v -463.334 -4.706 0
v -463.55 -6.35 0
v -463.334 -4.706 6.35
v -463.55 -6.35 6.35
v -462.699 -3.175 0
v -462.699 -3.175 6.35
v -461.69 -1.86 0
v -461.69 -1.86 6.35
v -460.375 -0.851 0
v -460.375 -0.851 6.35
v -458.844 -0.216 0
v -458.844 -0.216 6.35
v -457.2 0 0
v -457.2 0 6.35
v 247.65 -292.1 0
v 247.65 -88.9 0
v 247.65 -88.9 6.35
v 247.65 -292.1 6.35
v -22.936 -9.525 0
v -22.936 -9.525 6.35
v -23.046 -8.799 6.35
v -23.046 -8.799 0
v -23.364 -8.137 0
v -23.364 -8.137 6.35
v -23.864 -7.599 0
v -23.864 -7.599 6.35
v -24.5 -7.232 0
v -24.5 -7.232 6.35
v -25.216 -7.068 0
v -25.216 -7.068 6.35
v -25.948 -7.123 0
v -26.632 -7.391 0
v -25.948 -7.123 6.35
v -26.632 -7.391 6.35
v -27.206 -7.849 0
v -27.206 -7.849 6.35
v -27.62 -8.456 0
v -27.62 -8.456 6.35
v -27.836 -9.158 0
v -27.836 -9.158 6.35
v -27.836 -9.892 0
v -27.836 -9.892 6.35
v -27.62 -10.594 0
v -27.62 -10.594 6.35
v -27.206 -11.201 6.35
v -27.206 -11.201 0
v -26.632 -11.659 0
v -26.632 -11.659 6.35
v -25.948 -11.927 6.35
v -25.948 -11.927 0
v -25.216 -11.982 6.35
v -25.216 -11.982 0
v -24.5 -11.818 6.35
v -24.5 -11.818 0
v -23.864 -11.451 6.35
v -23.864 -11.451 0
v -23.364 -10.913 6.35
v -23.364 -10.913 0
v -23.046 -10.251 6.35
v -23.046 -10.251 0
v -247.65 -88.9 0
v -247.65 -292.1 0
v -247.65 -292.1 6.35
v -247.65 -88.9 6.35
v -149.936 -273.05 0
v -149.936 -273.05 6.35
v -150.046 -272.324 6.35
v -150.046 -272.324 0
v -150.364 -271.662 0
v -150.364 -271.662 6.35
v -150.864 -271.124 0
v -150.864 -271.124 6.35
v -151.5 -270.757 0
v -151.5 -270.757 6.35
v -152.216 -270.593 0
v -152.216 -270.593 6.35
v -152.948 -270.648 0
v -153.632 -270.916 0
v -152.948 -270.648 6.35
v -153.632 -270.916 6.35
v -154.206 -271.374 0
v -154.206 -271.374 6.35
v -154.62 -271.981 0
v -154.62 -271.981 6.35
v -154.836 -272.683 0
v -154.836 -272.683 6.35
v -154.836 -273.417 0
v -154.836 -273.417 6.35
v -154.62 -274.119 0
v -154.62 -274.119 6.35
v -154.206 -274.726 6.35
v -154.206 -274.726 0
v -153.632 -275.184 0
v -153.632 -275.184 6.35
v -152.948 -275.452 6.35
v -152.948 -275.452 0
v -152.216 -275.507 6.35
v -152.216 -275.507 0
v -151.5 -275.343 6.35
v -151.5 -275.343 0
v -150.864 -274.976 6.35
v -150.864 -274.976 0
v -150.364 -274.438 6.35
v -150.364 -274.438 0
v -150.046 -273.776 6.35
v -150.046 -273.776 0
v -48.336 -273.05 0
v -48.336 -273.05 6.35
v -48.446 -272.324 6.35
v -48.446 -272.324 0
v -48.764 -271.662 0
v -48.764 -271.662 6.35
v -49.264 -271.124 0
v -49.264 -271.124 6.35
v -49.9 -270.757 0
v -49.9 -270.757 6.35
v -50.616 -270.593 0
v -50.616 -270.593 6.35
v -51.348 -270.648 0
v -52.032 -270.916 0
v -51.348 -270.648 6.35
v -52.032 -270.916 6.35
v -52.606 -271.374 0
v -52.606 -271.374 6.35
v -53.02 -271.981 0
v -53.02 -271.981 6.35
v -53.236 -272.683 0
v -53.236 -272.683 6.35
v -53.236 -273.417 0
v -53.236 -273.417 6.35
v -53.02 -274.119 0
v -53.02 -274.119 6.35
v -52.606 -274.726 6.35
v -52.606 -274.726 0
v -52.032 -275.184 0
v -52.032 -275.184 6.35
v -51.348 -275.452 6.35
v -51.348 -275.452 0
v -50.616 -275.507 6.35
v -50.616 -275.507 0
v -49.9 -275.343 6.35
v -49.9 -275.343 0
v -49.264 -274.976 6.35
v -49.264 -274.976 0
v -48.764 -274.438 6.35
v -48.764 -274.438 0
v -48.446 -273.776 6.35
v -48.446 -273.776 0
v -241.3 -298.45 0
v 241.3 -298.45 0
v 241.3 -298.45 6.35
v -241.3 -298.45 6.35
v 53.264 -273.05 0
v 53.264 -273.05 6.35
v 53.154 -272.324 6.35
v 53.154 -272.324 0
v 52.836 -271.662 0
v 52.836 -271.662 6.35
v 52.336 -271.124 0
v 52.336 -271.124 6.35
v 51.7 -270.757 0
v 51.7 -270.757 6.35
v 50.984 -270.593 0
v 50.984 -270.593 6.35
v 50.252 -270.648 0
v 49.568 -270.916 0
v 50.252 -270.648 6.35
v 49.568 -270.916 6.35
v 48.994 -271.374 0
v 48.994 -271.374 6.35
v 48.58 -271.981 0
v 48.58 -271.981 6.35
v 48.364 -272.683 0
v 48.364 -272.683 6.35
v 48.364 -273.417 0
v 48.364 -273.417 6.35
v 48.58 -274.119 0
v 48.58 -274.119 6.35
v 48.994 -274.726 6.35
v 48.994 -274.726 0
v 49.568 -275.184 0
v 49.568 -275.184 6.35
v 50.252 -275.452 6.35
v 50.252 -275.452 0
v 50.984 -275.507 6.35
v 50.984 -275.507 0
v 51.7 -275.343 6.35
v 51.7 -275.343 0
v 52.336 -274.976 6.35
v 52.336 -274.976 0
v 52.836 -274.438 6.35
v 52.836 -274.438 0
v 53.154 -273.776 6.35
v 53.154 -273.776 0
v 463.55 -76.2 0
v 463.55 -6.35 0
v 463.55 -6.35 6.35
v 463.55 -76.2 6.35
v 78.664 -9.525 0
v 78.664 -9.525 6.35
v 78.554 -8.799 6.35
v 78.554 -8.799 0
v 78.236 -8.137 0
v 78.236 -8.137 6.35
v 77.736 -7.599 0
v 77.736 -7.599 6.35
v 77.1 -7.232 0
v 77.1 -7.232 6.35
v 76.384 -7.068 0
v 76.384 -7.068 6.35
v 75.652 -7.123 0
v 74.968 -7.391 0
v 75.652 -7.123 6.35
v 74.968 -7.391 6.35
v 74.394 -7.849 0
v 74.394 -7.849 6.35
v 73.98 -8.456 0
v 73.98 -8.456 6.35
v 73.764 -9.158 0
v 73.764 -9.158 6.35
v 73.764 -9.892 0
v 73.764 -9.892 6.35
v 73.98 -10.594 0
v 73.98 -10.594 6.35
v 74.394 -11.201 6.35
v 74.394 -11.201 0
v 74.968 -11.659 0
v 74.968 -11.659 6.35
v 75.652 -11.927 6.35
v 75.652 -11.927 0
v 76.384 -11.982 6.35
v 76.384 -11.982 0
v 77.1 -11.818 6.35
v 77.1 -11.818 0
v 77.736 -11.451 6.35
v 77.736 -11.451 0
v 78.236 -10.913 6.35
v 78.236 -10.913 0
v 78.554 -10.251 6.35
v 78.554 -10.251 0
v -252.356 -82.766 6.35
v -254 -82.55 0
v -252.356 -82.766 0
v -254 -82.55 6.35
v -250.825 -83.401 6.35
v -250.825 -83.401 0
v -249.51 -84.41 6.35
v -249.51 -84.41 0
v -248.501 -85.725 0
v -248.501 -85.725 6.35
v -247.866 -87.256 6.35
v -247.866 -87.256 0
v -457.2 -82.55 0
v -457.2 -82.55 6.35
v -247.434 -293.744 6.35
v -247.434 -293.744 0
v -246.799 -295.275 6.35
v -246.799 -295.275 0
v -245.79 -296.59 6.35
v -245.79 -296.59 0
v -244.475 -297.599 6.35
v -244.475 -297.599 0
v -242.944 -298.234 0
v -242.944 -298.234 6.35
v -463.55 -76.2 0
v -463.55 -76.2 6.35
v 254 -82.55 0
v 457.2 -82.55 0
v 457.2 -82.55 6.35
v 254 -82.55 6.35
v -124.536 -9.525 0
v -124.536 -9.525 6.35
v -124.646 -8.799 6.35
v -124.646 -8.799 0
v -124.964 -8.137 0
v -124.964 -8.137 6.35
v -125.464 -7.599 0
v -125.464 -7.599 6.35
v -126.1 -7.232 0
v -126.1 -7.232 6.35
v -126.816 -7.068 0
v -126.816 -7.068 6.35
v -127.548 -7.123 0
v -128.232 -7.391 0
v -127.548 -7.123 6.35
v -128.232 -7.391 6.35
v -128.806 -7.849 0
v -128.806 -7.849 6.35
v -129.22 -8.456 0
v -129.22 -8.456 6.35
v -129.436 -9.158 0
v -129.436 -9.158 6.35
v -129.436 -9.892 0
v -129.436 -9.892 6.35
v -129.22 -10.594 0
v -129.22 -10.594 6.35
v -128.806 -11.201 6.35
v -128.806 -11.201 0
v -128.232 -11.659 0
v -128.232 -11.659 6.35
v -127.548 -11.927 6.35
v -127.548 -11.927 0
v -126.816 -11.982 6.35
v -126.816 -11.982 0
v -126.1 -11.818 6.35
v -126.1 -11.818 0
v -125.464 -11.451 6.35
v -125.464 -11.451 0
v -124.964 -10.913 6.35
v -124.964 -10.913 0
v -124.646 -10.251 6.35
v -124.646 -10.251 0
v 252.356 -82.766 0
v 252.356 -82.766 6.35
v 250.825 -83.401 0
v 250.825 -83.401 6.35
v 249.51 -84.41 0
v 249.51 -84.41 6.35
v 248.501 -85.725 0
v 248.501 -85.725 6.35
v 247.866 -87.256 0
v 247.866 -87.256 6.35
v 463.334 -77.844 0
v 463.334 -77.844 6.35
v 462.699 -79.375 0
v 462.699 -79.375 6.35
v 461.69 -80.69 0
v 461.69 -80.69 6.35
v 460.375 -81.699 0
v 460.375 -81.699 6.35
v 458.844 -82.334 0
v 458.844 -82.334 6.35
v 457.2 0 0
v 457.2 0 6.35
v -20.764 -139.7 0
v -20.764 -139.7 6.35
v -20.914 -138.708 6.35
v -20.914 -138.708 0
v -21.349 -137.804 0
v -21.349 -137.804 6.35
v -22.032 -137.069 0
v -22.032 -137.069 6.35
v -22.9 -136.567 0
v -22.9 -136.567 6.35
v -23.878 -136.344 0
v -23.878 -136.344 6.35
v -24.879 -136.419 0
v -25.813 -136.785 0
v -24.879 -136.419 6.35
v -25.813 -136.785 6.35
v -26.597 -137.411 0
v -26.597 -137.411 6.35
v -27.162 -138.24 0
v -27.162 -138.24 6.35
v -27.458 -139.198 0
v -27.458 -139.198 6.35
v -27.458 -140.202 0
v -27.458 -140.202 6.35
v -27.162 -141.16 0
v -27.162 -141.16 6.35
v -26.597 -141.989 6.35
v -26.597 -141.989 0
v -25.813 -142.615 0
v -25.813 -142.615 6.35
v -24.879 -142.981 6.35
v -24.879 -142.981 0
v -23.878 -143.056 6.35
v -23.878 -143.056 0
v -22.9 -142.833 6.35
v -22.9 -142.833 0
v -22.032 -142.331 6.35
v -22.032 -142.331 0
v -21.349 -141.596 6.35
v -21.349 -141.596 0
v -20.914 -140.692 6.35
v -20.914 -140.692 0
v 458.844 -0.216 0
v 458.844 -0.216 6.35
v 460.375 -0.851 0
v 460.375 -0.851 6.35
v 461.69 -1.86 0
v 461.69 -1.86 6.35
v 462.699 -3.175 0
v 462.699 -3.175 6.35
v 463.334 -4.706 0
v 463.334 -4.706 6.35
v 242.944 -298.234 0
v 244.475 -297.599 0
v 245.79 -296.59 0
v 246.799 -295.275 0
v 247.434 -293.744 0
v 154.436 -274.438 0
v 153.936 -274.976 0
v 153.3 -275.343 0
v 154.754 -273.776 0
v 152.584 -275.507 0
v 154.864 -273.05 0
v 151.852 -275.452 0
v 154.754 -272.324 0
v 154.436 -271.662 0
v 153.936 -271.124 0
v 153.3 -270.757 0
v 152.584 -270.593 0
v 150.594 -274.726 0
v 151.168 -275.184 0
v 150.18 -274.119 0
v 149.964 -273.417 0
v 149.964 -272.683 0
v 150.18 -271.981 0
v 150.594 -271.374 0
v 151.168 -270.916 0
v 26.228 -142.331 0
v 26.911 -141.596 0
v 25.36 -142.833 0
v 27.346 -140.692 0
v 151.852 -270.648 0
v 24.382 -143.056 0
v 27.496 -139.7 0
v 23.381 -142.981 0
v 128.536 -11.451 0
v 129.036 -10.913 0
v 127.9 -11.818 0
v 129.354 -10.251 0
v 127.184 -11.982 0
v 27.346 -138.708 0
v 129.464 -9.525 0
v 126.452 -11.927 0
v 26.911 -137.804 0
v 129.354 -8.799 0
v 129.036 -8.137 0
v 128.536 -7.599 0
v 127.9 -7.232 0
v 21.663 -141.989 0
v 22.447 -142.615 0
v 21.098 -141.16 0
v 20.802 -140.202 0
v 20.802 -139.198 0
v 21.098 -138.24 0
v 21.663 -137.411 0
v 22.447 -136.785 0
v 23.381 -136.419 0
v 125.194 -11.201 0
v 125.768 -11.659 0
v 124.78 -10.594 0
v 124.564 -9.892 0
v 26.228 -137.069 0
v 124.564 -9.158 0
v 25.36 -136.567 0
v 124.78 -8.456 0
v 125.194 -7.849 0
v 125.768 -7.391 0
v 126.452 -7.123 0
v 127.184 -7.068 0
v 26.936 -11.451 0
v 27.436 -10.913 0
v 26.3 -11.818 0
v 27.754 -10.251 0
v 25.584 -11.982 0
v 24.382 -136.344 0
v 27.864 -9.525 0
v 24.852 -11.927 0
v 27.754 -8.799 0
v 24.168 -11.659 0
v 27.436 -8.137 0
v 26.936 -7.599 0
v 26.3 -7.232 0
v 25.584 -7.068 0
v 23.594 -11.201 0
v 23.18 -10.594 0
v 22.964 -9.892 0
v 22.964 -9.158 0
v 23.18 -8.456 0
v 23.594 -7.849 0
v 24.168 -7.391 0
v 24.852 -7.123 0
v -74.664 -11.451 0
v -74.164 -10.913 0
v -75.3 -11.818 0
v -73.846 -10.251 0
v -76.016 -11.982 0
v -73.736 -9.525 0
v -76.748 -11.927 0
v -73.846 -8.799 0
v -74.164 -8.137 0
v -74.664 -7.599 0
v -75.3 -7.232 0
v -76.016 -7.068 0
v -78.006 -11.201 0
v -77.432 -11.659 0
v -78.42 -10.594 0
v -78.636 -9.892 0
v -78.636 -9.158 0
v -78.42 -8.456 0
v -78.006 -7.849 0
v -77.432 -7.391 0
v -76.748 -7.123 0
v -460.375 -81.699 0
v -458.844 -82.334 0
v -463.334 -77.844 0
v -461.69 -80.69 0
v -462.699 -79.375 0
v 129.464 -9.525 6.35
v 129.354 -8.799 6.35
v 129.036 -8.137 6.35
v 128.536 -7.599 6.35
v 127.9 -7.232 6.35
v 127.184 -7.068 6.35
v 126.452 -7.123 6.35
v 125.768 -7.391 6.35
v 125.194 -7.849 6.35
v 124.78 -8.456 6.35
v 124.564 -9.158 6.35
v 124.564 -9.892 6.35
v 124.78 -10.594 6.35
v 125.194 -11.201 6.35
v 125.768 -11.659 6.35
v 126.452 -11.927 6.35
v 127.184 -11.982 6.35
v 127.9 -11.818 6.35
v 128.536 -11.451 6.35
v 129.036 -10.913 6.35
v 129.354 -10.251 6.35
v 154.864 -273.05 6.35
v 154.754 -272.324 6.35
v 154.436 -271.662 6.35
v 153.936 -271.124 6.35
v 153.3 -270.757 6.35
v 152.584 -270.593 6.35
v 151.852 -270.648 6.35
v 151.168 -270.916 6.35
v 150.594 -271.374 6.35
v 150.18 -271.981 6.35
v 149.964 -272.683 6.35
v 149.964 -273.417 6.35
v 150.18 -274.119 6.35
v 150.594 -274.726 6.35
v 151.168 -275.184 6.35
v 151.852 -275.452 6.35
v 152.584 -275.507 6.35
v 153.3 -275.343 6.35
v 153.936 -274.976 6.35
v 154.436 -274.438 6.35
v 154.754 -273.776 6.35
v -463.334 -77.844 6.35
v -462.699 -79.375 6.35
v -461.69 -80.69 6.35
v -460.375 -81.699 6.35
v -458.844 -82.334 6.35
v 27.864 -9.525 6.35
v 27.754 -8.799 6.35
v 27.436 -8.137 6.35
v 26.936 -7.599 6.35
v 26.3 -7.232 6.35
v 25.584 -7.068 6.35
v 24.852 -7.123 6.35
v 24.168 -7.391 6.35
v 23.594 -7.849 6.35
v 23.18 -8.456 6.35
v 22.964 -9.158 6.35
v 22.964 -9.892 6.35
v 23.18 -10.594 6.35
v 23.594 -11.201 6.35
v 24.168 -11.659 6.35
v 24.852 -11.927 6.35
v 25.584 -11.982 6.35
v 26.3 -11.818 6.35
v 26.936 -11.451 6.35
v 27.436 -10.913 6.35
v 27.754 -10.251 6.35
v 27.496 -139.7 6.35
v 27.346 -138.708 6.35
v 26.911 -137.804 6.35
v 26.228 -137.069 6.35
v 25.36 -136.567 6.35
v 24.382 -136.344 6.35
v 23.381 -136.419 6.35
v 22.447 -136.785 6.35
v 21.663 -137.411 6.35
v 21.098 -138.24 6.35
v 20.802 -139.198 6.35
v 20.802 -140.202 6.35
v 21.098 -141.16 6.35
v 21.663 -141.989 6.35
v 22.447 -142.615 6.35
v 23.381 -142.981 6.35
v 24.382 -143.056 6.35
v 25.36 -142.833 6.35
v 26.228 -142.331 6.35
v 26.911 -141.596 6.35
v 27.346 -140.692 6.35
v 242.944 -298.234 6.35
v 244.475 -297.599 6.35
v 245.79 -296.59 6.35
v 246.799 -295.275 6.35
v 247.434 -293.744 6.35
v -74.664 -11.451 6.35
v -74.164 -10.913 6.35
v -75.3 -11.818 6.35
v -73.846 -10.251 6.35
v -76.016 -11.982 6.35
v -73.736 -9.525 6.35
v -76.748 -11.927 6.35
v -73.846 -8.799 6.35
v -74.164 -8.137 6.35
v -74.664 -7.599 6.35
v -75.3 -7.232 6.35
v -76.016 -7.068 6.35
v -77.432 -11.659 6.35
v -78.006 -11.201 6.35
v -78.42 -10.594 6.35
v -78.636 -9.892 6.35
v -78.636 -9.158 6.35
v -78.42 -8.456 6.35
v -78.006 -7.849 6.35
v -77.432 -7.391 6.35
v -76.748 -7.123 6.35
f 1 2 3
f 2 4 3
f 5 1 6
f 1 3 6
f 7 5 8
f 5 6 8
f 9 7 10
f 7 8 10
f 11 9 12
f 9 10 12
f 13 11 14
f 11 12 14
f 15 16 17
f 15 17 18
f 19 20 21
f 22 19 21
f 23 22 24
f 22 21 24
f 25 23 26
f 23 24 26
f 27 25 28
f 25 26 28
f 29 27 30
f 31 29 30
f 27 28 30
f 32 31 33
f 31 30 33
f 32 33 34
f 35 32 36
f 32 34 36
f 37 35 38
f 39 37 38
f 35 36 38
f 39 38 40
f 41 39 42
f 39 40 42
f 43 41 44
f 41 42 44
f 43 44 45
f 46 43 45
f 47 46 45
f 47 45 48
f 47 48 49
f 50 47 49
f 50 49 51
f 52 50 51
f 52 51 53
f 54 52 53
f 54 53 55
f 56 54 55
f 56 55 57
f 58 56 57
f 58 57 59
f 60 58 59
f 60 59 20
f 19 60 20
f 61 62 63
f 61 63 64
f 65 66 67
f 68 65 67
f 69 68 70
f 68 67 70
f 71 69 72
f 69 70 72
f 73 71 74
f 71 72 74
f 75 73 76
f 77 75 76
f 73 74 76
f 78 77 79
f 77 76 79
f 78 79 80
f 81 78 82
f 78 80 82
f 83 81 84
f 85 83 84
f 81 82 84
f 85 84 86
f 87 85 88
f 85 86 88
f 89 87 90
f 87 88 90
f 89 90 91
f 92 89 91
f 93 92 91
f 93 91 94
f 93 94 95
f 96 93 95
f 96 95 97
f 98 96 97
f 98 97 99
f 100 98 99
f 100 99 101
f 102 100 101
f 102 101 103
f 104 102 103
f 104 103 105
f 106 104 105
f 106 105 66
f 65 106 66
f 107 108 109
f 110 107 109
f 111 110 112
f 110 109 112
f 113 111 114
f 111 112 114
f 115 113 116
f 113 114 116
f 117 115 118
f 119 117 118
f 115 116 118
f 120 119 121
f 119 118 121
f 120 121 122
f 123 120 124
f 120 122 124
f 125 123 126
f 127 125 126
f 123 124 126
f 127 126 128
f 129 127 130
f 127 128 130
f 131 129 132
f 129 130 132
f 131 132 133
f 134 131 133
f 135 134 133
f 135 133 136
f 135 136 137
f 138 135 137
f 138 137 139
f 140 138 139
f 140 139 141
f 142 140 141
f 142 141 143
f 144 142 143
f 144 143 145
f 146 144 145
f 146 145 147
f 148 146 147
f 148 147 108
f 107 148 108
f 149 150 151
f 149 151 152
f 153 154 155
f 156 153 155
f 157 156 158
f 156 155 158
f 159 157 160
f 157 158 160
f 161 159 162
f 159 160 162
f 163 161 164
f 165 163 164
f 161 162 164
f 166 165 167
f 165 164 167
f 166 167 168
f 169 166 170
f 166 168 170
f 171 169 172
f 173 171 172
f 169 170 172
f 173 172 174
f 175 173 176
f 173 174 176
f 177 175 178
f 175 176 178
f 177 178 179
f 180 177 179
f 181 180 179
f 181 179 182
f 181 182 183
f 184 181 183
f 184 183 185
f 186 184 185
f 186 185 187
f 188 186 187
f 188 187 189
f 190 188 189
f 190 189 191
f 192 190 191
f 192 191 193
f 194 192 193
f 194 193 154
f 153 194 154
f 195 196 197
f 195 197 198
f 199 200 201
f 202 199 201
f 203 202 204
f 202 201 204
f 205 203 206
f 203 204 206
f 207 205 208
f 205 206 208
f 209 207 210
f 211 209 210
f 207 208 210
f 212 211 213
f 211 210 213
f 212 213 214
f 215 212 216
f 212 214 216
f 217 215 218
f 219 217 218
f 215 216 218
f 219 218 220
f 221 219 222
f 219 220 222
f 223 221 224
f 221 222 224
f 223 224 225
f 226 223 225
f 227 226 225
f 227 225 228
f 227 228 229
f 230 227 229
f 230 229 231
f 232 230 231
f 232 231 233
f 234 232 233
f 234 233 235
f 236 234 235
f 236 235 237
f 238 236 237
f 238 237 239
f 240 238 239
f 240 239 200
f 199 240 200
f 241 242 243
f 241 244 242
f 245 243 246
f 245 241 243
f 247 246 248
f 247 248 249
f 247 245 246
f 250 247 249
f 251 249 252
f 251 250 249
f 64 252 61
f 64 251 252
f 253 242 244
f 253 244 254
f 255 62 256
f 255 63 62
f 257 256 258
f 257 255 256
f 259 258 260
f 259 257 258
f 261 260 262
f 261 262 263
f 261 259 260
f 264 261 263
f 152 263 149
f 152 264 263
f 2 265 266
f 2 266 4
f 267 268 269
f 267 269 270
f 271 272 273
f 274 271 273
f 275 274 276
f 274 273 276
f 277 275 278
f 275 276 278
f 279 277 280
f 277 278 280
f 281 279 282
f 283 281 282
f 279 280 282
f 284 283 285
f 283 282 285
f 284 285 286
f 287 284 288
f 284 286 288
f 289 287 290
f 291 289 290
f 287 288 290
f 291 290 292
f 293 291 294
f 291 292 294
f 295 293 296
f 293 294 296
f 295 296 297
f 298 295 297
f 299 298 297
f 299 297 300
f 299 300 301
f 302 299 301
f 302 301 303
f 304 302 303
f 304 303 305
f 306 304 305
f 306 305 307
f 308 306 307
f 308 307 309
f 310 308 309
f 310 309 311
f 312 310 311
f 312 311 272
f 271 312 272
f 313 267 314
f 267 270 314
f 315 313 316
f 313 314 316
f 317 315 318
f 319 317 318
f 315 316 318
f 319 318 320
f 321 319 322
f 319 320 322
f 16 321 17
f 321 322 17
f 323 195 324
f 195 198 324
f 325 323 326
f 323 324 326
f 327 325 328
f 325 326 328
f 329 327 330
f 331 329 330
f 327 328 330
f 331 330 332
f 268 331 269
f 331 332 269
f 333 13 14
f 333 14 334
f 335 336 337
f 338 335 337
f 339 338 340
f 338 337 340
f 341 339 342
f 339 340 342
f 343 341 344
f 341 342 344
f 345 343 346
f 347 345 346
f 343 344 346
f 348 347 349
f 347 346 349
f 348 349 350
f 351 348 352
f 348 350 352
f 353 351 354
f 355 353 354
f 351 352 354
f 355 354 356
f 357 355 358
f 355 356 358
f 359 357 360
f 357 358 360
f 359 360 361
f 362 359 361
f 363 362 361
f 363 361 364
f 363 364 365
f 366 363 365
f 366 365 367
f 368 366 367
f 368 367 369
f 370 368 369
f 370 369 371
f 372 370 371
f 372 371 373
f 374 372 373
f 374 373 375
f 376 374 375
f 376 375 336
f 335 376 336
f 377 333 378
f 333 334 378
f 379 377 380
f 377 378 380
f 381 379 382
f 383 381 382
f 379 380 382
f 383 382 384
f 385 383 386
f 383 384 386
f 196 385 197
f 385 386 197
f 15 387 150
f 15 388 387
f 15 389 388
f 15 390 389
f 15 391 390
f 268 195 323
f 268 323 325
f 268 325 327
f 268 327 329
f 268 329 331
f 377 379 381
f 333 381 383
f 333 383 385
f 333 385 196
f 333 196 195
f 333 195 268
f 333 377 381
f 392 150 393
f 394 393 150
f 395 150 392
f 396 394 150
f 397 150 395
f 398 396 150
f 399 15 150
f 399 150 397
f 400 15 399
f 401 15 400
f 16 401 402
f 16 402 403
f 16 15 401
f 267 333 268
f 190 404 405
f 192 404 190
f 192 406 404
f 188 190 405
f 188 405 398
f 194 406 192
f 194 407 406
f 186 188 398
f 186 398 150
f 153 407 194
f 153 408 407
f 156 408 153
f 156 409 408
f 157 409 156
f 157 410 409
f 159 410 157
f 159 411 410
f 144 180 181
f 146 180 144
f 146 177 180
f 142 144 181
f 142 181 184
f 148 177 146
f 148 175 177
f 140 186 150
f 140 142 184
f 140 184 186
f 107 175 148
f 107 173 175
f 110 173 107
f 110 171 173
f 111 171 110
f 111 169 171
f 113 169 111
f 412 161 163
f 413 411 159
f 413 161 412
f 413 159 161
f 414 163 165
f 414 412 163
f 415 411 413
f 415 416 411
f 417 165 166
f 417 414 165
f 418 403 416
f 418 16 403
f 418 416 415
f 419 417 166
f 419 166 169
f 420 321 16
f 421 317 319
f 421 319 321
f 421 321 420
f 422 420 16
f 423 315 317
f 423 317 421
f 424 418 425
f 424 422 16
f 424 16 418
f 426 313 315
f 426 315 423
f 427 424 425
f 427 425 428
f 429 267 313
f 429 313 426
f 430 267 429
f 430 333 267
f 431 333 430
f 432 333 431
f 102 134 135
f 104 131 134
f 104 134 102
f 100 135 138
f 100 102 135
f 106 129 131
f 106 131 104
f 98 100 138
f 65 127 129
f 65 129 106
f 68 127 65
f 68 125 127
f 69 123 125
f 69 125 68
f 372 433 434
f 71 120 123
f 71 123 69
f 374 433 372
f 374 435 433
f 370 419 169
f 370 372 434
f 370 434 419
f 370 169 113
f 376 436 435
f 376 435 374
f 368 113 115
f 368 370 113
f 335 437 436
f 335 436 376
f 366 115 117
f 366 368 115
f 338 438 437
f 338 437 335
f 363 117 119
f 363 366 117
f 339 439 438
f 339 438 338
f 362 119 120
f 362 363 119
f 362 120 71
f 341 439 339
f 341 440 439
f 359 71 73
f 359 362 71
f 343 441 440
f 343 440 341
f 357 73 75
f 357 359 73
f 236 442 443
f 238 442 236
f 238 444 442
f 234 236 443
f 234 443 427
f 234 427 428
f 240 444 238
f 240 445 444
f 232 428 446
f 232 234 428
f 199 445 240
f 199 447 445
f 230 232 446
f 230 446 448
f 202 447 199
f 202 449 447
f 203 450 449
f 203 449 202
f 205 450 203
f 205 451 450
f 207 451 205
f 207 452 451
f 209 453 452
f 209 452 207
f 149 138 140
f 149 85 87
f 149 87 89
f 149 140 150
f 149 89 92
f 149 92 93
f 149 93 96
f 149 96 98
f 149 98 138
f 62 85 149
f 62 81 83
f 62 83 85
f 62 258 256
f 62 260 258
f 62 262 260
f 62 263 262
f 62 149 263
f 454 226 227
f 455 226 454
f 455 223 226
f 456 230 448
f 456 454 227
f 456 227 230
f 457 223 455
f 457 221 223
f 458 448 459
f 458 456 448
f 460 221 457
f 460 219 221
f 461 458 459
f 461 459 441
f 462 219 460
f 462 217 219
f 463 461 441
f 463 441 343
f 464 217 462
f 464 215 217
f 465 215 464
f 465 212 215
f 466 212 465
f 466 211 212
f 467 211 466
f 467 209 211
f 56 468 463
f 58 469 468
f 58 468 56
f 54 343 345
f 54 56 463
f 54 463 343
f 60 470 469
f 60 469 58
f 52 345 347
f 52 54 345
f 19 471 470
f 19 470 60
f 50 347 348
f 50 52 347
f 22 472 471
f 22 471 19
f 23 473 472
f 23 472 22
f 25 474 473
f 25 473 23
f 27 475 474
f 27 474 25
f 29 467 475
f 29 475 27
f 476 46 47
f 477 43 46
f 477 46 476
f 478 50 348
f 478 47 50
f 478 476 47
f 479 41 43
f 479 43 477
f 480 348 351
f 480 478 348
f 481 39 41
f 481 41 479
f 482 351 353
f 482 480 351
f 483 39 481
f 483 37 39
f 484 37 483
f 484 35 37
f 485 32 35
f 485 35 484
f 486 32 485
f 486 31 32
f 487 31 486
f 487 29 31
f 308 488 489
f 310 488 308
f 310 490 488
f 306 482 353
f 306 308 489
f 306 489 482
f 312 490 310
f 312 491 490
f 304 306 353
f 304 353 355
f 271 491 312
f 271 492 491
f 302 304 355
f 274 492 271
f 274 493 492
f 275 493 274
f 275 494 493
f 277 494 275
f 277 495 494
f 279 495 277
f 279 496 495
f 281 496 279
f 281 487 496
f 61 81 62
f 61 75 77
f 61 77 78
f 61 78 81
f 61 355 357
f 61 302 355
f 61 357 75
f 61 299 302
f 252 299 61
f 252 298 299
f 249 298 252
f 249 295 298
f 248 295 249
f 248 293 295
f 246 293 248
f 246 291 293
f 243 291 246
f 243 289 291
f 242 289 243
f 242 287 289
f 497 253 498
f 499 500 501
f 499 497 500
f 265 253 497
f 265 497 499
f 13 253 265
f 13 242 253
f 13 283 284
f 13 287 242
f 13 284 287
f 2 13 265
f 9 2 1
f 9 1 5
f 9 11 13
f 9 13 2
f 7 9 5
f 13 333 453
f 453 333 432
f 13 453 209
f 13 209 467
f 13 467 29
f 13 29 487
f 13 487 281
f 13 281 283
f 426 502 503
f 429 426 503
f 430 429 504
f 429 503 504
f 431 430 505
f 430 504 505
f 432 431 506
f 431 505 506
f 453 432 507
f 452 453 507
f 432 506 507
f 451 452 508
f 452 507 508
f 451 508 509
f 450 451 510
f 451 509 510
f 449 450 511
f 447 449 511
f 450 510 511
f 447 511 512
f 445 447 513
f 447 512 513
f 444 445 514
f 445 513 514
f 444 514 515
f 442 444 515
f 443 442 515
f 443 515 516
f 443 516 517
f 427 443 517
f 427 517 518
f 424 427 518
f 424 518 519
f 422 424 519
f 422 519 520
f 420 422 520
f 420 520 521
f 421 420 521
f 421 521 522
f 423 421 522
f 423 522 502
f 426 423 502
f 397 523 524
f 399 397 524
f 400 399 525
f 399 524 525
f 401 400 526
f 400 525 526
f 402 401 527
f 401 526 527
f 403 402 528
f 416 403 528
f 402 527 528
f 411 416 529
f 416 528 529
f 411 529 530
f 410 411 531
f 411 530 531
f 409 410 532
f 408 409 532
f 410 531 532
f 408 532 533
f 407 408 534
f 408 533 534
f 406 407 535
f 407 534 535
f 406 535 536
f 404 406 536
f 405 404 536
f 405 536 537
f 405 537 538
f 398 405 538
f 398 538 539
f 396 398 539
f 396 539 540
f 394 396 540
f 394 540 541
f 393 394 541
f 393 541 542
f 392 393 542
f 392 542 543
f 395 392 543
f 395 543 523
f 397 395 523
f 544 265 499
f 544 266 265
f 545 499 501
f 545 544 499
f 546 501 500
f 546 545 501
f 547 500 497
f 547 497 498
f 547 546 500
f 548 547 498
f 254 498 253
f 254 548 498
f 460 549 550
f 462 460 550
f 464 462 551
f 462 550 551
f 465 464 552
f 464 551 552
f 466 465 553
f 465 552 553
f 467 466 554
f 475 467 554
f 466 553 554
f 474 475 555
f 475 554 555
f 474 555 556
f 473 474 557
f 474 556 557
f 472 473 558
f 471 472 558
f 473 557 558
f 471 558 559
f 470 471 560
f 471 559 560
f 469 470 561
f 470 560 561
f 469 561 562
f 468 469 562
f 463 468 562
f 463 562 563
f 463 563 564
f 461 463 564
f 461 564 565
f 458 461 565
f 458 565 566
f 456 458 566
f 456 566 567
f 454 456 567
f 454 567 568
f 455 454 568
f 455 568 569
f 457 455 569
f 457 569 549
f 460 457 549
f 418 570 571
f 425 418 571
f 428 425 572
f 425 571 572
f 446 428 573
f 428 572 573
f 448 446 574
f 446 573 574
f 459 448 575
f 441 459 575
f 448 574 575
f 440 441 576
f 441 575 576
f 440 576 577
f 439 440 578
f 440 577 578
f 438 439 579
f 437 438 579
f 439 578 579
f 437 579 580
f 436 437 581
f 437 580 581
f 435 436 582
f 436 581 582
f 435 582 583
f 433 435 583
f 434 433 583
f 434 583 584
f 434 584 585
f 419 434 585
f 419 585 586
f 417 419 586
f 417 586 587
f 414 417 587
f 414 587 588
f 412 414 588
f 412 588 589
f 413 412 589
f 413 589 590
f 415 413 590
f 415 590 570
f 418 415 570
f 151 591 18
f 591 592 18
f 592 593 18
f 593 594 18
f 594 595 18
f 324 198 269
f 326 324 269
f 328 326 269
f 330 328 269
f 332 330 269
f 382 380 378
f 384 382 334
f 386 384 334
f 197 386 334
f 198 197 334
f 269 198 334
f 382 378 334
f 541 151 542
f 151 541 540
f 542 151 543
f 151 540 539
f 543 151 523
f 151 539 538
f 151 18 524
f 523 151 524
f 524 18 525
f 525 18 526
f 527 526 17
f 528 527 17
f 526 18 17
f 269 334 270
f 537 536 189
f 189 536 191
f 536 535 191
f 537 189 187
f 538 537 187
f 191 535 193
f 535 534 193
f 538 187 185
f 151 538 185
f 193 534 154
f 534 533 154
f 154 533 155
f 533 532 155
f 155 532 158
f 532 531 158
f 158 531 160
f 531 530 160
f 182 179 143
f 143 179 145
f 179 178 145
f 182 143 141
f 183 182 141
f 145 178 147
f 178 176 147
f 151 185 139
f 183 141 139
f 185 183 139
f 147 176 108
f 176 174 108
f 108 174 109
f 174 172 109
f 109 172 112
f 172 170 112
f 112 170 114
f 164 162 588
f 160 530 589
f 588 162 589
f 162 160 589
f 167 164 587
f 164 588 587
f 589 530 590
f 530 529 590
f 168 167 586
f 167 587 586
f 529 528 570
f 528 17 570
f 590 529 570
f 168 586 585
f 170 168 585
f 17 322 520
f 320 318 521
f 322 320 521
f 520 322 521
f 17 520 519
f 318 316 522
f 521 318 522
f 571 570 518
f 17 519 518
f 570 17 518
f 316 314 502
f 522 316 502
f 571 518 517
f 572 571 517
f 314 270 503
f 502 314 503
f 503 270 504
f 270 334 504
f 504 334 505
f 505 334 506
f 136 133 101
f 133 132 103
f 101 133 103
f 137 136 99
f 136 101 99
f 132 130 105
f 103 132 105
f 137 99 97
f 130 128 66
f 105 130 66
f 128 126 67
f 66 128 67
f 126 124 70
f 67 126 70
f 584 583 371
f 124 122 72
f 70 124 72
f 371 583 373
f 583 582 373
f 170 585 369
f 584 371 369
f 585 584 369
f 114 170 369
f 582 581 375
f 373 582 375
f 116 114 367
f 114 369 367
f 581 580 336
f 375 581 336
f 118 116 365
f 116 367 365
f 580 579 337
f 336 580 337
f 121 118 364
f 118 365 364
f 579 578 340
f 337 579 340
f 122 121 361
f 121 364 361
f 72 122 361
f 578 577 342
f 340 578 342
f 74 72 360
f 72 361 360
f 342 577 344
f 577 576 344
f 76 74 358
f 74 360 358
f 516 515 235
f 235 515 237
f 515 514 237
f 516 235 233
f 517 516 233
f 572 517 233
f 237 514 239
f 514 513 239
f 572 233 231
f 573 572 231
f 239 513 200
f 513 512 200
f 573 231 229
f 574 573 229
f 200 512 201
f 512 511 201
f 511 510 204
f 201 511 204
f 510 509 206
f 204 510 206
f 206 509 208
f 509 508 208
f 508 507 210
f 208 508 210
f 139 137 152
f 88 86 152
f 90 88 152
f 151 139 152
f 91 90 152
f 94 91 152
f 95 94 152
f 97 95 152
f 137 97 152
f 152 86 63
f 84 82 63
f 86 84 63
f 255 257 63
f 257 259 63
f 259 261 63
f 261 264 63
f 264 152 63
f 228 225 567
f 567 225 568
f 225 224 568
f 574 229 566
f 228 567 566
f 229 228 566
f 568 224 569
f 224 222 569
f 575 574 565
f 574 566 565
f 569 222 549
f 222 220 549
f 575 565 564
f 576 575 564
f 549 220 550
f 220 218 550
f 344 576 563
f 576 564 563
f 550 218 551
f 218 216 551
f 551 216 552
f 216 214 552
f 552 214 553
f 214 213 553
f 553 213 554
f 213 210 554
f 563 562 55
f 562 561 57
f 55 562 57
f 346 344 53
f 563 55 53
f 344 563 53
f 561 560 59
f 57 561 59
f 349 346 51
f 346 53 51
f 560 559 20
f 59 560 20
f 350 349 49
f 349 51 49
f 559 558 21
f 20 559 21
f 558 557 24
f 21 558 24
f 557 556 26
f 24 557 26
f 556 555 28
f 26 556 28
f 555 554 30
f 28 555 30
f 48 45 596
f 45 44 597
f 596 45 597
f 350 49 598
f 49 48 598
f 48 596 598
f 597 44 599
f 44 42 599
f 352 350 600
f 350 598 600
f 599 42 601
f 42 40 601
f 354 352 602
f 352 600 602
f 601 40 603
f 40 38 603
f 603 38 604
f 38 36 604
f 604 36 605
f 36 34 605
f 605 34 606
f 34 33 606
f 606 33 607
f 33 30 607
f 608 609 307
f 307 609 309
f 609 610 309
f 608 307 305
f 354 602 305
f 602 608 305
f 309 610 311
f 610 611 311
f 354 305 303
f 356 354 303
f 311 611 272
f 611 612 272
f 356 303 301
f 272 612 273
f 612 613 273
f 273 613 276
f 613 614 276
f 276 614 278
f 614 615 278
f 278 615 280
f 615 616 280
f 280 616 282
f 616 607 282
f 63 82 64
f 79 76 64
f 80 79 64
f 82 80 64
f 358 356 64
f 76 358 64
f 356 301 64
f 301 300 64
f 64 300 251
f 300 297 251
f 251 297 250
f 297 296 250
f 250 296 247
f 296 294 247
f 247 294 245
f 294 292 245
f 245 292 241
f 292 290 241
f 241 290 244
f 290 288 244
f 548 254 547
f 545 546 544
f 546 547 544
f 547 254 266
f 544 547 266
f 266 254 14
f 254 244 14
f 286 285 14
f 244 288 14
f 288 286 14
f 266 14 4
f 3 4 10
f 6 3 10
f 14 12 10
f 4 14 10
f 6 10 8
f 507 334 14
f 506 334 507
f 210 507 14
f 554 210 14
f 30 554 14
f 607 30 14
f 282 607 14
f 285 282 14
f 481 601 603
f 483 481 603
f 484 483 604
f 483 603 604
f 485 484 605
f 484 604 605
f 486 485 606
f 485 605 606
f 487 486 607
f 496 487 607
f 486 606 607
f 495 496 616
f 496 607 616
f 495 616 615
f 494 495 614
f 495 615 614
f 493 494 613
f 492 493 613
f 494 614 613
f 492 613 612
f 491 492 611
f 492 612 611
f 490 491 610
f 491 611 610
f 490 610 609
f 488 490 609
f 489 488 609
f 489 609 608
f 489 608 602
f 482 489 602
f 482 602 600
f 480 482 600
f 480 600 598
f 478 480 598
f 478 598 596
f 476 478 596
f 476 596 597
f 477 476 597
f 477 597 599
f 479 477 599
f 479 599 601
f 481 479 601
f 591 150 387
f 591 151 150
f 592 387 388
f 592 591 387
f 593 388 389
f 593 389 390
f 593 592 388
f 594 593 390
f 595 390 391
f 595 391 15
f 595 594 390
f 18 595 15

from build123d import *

# Parameters (mm, degrees)
BOSS_EXTRUDE1_DEPTH = 6.35
SKETCH2_R           = 2.4638
CUT_EXTRUDE1_DEPTH  = 7.35
LPATTERN1_COUNT     = 6
LPATTERN1_PITCH     = 50.8
SKETCH3_R           = 2.4638
CUT_EXTRUDE2_DEPTH  = 7.35
LPATTERN2_COUNT     = 4
LPATTERN2_PITCH     = 101.6
SKETCH4_R           = 3.3655
CUT_EXTRUDE3_DEPTH  = 7.35
FILLET1_R           = 6.35


with BuildPart() as part:
    # Sketch1 → Boss-Extrude1 (new body)
    with BuildSketch(Plane.XY):
        Polygon((-463.55, -82.55), (-463.55, 0), (463.55, 0), (463.55, -82.55), (247.65, -82.55), (247.65, -298.45), (-247.65, -298.45), (-247.65, -82.55), align=None)
    extrude(amount=BOSS_EXTRUDE1_DEPTH)

    # Sketch2 → Cut-Extrude1 (cut, through all)
    with BuildSketch(Plane.XY.offset(6.35)):
        with Locations((127, -9.525)):
            Circle(SKETCH2_R)
    cut_extrude1 = extrude(amount=-CUT_EXTRUDE1_DEPTH, mode=Mode.SUBTRACT)

    # LPattern1: Cut-Extrude1 ×6
    with Locations(*[(-i * LPATTERN1_PITCH, 0, 0) for i in range(1, LPATTERN1_COUNT)]):
        add(cut_extrude1, mode=Mode.SUBTRACT)

    # Sketch3 → Cut-Extrude2 (cut, through all)
    with BuildSketch(Plane.XY.offset(6.35)):
        with Locations((-152.4, -273.05)):
            Circle(SKETCH3_R)
    cut_extrude2 = extrude(amount=-CUT_EXTRUDE2_DEPTH, mode=Mode.SUBTRACT)

    # LPattern2: Cut-Extrude2 ×4
    with Locations(*[(i * LPATTERN2_PITCH, 0, 0) for i in range(1, LPATTERN2_COUNT)]):
        add(cut_extrude2, mode=Mode.SUBTRACT)

    # Sketch4 → Cut-Extrude3 (cut, through all)
    with BuildSketch(Plane.XY.offset(6.35)):
        with Locations((-24.13, -139.7)):
            Circle(SKETCH4_R)
        with Locations((24.13, -139.7)):
            Circle(SKETCH4_R)
    extrude(amount=-CUT_EXTRUDE3_DEPTH, mode=Mode.SUBTRACT)

    # Fillet1
    fillet1_edges = [part.edges().sort_by_distance(p)[0] for p in [
        (-463.55, -82.55, 3.175),
        (-463.55, 0, 3.175),
        (463.55, 0, 3.175),
        (463.55, -82.55, 3.175),
        (247.65, -82.55, 3.175),
        (247.65, -298.45, 3.175),
        (-247.65, -298.45, 3.175),
        (-247.65, -82.55, 3.175),
    ]]
    fillet(fillet1_edges, radius=FILLET1_R)


solid = part.part
